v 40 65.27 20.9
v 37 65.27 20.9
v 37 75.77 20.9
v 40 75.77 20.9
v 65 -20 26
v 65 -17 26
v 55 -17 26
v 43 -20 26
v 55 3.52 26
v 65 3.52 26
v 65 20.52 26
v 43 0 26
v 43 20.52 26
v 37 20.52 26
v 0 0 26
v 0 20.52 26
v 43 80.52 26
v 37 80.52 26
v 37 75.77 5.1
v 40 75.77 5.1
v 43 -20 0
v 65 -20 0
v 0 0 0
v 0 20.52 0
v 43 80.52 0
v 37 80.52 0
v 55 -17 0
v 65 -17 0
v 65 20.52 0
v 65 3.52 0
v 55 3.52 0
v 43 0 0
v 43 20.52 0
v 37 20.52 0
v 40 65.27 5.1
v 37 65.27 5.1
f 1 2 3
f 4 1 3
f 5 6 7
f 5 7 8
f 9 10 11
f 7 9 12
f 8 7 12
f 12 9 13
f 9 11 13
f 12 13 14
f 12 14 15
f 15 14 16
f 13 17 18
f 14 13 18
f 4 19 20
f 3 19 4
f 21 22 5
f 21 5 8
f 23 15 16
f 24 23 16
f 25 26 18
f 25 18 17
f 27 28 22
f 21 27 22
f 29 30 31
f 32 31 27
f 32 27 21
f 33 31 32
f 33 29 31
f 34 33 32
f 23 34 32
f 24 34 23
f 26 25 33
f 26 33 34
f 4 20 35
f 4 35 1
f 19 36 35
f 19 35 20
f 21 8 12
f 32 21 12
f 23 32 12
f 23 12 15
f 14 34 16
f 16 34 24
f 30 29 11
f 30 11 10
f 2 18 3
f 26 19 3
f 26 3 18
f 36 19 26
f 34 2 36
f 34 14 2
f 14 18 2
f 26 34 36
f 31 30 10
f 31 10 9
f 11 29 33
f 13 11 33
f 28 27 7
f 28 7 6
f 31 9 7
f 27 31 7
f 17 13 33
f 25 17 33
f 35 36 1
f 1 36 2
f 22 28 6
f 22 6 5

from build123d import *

# Parameters (mm, degrees)
BOSS_EXTRUDE1_DEPTH = 26
SKETCH2_W           = 6
SKETCH2_H           = 26
BOSS_EXTRUDE2_DEPTH = 60
SKETCH3_W           = 15.8
SKETCH3_H           = 10.5
CUT_EXTRUDE1_DEPTH  = 3


with BuildPart() as part:
    # Sketch1 → Boss-Extrude1 (new body)
    with BuildSketch(Plane.XY):
        Polygon((45, 20.52), (65, 20.52), (65, 3.52), (55, 3.52), (55, -17), (65, -17), (65, -20), (43, -20), (43, 0), (0, 0), (0, 20.52), align=None)
    extrude(amount=BOSS_EXTRUDE1_DEPTH)

    # Sketch2 → Boss-Extrude2 (add)
    with BuildSketch(Plane(origin=(0, 20.52, 0), x_dir=(1, 0, 0), z_dir=(0, 1, 0))):
        with Locations((40, -13)):
            Rectangle(SKETCH2_W, SKETCH2_H)
    extrude(amount=BOSS_EXTRUDE2_DEPTH)

    # Sketch3 → Cut-Extrude1 (cut)
    with BuildSketch(Plane.ZY.offset(-37)):
        with Locations((13, 70.52)):
            Rectangle(SKETCH3_W, SKETCH3_H)
    extrude(amount=-CUT_EXTRUDE1_DEPTH, mode=Mode.SUBTRACT)


solid = part.part
